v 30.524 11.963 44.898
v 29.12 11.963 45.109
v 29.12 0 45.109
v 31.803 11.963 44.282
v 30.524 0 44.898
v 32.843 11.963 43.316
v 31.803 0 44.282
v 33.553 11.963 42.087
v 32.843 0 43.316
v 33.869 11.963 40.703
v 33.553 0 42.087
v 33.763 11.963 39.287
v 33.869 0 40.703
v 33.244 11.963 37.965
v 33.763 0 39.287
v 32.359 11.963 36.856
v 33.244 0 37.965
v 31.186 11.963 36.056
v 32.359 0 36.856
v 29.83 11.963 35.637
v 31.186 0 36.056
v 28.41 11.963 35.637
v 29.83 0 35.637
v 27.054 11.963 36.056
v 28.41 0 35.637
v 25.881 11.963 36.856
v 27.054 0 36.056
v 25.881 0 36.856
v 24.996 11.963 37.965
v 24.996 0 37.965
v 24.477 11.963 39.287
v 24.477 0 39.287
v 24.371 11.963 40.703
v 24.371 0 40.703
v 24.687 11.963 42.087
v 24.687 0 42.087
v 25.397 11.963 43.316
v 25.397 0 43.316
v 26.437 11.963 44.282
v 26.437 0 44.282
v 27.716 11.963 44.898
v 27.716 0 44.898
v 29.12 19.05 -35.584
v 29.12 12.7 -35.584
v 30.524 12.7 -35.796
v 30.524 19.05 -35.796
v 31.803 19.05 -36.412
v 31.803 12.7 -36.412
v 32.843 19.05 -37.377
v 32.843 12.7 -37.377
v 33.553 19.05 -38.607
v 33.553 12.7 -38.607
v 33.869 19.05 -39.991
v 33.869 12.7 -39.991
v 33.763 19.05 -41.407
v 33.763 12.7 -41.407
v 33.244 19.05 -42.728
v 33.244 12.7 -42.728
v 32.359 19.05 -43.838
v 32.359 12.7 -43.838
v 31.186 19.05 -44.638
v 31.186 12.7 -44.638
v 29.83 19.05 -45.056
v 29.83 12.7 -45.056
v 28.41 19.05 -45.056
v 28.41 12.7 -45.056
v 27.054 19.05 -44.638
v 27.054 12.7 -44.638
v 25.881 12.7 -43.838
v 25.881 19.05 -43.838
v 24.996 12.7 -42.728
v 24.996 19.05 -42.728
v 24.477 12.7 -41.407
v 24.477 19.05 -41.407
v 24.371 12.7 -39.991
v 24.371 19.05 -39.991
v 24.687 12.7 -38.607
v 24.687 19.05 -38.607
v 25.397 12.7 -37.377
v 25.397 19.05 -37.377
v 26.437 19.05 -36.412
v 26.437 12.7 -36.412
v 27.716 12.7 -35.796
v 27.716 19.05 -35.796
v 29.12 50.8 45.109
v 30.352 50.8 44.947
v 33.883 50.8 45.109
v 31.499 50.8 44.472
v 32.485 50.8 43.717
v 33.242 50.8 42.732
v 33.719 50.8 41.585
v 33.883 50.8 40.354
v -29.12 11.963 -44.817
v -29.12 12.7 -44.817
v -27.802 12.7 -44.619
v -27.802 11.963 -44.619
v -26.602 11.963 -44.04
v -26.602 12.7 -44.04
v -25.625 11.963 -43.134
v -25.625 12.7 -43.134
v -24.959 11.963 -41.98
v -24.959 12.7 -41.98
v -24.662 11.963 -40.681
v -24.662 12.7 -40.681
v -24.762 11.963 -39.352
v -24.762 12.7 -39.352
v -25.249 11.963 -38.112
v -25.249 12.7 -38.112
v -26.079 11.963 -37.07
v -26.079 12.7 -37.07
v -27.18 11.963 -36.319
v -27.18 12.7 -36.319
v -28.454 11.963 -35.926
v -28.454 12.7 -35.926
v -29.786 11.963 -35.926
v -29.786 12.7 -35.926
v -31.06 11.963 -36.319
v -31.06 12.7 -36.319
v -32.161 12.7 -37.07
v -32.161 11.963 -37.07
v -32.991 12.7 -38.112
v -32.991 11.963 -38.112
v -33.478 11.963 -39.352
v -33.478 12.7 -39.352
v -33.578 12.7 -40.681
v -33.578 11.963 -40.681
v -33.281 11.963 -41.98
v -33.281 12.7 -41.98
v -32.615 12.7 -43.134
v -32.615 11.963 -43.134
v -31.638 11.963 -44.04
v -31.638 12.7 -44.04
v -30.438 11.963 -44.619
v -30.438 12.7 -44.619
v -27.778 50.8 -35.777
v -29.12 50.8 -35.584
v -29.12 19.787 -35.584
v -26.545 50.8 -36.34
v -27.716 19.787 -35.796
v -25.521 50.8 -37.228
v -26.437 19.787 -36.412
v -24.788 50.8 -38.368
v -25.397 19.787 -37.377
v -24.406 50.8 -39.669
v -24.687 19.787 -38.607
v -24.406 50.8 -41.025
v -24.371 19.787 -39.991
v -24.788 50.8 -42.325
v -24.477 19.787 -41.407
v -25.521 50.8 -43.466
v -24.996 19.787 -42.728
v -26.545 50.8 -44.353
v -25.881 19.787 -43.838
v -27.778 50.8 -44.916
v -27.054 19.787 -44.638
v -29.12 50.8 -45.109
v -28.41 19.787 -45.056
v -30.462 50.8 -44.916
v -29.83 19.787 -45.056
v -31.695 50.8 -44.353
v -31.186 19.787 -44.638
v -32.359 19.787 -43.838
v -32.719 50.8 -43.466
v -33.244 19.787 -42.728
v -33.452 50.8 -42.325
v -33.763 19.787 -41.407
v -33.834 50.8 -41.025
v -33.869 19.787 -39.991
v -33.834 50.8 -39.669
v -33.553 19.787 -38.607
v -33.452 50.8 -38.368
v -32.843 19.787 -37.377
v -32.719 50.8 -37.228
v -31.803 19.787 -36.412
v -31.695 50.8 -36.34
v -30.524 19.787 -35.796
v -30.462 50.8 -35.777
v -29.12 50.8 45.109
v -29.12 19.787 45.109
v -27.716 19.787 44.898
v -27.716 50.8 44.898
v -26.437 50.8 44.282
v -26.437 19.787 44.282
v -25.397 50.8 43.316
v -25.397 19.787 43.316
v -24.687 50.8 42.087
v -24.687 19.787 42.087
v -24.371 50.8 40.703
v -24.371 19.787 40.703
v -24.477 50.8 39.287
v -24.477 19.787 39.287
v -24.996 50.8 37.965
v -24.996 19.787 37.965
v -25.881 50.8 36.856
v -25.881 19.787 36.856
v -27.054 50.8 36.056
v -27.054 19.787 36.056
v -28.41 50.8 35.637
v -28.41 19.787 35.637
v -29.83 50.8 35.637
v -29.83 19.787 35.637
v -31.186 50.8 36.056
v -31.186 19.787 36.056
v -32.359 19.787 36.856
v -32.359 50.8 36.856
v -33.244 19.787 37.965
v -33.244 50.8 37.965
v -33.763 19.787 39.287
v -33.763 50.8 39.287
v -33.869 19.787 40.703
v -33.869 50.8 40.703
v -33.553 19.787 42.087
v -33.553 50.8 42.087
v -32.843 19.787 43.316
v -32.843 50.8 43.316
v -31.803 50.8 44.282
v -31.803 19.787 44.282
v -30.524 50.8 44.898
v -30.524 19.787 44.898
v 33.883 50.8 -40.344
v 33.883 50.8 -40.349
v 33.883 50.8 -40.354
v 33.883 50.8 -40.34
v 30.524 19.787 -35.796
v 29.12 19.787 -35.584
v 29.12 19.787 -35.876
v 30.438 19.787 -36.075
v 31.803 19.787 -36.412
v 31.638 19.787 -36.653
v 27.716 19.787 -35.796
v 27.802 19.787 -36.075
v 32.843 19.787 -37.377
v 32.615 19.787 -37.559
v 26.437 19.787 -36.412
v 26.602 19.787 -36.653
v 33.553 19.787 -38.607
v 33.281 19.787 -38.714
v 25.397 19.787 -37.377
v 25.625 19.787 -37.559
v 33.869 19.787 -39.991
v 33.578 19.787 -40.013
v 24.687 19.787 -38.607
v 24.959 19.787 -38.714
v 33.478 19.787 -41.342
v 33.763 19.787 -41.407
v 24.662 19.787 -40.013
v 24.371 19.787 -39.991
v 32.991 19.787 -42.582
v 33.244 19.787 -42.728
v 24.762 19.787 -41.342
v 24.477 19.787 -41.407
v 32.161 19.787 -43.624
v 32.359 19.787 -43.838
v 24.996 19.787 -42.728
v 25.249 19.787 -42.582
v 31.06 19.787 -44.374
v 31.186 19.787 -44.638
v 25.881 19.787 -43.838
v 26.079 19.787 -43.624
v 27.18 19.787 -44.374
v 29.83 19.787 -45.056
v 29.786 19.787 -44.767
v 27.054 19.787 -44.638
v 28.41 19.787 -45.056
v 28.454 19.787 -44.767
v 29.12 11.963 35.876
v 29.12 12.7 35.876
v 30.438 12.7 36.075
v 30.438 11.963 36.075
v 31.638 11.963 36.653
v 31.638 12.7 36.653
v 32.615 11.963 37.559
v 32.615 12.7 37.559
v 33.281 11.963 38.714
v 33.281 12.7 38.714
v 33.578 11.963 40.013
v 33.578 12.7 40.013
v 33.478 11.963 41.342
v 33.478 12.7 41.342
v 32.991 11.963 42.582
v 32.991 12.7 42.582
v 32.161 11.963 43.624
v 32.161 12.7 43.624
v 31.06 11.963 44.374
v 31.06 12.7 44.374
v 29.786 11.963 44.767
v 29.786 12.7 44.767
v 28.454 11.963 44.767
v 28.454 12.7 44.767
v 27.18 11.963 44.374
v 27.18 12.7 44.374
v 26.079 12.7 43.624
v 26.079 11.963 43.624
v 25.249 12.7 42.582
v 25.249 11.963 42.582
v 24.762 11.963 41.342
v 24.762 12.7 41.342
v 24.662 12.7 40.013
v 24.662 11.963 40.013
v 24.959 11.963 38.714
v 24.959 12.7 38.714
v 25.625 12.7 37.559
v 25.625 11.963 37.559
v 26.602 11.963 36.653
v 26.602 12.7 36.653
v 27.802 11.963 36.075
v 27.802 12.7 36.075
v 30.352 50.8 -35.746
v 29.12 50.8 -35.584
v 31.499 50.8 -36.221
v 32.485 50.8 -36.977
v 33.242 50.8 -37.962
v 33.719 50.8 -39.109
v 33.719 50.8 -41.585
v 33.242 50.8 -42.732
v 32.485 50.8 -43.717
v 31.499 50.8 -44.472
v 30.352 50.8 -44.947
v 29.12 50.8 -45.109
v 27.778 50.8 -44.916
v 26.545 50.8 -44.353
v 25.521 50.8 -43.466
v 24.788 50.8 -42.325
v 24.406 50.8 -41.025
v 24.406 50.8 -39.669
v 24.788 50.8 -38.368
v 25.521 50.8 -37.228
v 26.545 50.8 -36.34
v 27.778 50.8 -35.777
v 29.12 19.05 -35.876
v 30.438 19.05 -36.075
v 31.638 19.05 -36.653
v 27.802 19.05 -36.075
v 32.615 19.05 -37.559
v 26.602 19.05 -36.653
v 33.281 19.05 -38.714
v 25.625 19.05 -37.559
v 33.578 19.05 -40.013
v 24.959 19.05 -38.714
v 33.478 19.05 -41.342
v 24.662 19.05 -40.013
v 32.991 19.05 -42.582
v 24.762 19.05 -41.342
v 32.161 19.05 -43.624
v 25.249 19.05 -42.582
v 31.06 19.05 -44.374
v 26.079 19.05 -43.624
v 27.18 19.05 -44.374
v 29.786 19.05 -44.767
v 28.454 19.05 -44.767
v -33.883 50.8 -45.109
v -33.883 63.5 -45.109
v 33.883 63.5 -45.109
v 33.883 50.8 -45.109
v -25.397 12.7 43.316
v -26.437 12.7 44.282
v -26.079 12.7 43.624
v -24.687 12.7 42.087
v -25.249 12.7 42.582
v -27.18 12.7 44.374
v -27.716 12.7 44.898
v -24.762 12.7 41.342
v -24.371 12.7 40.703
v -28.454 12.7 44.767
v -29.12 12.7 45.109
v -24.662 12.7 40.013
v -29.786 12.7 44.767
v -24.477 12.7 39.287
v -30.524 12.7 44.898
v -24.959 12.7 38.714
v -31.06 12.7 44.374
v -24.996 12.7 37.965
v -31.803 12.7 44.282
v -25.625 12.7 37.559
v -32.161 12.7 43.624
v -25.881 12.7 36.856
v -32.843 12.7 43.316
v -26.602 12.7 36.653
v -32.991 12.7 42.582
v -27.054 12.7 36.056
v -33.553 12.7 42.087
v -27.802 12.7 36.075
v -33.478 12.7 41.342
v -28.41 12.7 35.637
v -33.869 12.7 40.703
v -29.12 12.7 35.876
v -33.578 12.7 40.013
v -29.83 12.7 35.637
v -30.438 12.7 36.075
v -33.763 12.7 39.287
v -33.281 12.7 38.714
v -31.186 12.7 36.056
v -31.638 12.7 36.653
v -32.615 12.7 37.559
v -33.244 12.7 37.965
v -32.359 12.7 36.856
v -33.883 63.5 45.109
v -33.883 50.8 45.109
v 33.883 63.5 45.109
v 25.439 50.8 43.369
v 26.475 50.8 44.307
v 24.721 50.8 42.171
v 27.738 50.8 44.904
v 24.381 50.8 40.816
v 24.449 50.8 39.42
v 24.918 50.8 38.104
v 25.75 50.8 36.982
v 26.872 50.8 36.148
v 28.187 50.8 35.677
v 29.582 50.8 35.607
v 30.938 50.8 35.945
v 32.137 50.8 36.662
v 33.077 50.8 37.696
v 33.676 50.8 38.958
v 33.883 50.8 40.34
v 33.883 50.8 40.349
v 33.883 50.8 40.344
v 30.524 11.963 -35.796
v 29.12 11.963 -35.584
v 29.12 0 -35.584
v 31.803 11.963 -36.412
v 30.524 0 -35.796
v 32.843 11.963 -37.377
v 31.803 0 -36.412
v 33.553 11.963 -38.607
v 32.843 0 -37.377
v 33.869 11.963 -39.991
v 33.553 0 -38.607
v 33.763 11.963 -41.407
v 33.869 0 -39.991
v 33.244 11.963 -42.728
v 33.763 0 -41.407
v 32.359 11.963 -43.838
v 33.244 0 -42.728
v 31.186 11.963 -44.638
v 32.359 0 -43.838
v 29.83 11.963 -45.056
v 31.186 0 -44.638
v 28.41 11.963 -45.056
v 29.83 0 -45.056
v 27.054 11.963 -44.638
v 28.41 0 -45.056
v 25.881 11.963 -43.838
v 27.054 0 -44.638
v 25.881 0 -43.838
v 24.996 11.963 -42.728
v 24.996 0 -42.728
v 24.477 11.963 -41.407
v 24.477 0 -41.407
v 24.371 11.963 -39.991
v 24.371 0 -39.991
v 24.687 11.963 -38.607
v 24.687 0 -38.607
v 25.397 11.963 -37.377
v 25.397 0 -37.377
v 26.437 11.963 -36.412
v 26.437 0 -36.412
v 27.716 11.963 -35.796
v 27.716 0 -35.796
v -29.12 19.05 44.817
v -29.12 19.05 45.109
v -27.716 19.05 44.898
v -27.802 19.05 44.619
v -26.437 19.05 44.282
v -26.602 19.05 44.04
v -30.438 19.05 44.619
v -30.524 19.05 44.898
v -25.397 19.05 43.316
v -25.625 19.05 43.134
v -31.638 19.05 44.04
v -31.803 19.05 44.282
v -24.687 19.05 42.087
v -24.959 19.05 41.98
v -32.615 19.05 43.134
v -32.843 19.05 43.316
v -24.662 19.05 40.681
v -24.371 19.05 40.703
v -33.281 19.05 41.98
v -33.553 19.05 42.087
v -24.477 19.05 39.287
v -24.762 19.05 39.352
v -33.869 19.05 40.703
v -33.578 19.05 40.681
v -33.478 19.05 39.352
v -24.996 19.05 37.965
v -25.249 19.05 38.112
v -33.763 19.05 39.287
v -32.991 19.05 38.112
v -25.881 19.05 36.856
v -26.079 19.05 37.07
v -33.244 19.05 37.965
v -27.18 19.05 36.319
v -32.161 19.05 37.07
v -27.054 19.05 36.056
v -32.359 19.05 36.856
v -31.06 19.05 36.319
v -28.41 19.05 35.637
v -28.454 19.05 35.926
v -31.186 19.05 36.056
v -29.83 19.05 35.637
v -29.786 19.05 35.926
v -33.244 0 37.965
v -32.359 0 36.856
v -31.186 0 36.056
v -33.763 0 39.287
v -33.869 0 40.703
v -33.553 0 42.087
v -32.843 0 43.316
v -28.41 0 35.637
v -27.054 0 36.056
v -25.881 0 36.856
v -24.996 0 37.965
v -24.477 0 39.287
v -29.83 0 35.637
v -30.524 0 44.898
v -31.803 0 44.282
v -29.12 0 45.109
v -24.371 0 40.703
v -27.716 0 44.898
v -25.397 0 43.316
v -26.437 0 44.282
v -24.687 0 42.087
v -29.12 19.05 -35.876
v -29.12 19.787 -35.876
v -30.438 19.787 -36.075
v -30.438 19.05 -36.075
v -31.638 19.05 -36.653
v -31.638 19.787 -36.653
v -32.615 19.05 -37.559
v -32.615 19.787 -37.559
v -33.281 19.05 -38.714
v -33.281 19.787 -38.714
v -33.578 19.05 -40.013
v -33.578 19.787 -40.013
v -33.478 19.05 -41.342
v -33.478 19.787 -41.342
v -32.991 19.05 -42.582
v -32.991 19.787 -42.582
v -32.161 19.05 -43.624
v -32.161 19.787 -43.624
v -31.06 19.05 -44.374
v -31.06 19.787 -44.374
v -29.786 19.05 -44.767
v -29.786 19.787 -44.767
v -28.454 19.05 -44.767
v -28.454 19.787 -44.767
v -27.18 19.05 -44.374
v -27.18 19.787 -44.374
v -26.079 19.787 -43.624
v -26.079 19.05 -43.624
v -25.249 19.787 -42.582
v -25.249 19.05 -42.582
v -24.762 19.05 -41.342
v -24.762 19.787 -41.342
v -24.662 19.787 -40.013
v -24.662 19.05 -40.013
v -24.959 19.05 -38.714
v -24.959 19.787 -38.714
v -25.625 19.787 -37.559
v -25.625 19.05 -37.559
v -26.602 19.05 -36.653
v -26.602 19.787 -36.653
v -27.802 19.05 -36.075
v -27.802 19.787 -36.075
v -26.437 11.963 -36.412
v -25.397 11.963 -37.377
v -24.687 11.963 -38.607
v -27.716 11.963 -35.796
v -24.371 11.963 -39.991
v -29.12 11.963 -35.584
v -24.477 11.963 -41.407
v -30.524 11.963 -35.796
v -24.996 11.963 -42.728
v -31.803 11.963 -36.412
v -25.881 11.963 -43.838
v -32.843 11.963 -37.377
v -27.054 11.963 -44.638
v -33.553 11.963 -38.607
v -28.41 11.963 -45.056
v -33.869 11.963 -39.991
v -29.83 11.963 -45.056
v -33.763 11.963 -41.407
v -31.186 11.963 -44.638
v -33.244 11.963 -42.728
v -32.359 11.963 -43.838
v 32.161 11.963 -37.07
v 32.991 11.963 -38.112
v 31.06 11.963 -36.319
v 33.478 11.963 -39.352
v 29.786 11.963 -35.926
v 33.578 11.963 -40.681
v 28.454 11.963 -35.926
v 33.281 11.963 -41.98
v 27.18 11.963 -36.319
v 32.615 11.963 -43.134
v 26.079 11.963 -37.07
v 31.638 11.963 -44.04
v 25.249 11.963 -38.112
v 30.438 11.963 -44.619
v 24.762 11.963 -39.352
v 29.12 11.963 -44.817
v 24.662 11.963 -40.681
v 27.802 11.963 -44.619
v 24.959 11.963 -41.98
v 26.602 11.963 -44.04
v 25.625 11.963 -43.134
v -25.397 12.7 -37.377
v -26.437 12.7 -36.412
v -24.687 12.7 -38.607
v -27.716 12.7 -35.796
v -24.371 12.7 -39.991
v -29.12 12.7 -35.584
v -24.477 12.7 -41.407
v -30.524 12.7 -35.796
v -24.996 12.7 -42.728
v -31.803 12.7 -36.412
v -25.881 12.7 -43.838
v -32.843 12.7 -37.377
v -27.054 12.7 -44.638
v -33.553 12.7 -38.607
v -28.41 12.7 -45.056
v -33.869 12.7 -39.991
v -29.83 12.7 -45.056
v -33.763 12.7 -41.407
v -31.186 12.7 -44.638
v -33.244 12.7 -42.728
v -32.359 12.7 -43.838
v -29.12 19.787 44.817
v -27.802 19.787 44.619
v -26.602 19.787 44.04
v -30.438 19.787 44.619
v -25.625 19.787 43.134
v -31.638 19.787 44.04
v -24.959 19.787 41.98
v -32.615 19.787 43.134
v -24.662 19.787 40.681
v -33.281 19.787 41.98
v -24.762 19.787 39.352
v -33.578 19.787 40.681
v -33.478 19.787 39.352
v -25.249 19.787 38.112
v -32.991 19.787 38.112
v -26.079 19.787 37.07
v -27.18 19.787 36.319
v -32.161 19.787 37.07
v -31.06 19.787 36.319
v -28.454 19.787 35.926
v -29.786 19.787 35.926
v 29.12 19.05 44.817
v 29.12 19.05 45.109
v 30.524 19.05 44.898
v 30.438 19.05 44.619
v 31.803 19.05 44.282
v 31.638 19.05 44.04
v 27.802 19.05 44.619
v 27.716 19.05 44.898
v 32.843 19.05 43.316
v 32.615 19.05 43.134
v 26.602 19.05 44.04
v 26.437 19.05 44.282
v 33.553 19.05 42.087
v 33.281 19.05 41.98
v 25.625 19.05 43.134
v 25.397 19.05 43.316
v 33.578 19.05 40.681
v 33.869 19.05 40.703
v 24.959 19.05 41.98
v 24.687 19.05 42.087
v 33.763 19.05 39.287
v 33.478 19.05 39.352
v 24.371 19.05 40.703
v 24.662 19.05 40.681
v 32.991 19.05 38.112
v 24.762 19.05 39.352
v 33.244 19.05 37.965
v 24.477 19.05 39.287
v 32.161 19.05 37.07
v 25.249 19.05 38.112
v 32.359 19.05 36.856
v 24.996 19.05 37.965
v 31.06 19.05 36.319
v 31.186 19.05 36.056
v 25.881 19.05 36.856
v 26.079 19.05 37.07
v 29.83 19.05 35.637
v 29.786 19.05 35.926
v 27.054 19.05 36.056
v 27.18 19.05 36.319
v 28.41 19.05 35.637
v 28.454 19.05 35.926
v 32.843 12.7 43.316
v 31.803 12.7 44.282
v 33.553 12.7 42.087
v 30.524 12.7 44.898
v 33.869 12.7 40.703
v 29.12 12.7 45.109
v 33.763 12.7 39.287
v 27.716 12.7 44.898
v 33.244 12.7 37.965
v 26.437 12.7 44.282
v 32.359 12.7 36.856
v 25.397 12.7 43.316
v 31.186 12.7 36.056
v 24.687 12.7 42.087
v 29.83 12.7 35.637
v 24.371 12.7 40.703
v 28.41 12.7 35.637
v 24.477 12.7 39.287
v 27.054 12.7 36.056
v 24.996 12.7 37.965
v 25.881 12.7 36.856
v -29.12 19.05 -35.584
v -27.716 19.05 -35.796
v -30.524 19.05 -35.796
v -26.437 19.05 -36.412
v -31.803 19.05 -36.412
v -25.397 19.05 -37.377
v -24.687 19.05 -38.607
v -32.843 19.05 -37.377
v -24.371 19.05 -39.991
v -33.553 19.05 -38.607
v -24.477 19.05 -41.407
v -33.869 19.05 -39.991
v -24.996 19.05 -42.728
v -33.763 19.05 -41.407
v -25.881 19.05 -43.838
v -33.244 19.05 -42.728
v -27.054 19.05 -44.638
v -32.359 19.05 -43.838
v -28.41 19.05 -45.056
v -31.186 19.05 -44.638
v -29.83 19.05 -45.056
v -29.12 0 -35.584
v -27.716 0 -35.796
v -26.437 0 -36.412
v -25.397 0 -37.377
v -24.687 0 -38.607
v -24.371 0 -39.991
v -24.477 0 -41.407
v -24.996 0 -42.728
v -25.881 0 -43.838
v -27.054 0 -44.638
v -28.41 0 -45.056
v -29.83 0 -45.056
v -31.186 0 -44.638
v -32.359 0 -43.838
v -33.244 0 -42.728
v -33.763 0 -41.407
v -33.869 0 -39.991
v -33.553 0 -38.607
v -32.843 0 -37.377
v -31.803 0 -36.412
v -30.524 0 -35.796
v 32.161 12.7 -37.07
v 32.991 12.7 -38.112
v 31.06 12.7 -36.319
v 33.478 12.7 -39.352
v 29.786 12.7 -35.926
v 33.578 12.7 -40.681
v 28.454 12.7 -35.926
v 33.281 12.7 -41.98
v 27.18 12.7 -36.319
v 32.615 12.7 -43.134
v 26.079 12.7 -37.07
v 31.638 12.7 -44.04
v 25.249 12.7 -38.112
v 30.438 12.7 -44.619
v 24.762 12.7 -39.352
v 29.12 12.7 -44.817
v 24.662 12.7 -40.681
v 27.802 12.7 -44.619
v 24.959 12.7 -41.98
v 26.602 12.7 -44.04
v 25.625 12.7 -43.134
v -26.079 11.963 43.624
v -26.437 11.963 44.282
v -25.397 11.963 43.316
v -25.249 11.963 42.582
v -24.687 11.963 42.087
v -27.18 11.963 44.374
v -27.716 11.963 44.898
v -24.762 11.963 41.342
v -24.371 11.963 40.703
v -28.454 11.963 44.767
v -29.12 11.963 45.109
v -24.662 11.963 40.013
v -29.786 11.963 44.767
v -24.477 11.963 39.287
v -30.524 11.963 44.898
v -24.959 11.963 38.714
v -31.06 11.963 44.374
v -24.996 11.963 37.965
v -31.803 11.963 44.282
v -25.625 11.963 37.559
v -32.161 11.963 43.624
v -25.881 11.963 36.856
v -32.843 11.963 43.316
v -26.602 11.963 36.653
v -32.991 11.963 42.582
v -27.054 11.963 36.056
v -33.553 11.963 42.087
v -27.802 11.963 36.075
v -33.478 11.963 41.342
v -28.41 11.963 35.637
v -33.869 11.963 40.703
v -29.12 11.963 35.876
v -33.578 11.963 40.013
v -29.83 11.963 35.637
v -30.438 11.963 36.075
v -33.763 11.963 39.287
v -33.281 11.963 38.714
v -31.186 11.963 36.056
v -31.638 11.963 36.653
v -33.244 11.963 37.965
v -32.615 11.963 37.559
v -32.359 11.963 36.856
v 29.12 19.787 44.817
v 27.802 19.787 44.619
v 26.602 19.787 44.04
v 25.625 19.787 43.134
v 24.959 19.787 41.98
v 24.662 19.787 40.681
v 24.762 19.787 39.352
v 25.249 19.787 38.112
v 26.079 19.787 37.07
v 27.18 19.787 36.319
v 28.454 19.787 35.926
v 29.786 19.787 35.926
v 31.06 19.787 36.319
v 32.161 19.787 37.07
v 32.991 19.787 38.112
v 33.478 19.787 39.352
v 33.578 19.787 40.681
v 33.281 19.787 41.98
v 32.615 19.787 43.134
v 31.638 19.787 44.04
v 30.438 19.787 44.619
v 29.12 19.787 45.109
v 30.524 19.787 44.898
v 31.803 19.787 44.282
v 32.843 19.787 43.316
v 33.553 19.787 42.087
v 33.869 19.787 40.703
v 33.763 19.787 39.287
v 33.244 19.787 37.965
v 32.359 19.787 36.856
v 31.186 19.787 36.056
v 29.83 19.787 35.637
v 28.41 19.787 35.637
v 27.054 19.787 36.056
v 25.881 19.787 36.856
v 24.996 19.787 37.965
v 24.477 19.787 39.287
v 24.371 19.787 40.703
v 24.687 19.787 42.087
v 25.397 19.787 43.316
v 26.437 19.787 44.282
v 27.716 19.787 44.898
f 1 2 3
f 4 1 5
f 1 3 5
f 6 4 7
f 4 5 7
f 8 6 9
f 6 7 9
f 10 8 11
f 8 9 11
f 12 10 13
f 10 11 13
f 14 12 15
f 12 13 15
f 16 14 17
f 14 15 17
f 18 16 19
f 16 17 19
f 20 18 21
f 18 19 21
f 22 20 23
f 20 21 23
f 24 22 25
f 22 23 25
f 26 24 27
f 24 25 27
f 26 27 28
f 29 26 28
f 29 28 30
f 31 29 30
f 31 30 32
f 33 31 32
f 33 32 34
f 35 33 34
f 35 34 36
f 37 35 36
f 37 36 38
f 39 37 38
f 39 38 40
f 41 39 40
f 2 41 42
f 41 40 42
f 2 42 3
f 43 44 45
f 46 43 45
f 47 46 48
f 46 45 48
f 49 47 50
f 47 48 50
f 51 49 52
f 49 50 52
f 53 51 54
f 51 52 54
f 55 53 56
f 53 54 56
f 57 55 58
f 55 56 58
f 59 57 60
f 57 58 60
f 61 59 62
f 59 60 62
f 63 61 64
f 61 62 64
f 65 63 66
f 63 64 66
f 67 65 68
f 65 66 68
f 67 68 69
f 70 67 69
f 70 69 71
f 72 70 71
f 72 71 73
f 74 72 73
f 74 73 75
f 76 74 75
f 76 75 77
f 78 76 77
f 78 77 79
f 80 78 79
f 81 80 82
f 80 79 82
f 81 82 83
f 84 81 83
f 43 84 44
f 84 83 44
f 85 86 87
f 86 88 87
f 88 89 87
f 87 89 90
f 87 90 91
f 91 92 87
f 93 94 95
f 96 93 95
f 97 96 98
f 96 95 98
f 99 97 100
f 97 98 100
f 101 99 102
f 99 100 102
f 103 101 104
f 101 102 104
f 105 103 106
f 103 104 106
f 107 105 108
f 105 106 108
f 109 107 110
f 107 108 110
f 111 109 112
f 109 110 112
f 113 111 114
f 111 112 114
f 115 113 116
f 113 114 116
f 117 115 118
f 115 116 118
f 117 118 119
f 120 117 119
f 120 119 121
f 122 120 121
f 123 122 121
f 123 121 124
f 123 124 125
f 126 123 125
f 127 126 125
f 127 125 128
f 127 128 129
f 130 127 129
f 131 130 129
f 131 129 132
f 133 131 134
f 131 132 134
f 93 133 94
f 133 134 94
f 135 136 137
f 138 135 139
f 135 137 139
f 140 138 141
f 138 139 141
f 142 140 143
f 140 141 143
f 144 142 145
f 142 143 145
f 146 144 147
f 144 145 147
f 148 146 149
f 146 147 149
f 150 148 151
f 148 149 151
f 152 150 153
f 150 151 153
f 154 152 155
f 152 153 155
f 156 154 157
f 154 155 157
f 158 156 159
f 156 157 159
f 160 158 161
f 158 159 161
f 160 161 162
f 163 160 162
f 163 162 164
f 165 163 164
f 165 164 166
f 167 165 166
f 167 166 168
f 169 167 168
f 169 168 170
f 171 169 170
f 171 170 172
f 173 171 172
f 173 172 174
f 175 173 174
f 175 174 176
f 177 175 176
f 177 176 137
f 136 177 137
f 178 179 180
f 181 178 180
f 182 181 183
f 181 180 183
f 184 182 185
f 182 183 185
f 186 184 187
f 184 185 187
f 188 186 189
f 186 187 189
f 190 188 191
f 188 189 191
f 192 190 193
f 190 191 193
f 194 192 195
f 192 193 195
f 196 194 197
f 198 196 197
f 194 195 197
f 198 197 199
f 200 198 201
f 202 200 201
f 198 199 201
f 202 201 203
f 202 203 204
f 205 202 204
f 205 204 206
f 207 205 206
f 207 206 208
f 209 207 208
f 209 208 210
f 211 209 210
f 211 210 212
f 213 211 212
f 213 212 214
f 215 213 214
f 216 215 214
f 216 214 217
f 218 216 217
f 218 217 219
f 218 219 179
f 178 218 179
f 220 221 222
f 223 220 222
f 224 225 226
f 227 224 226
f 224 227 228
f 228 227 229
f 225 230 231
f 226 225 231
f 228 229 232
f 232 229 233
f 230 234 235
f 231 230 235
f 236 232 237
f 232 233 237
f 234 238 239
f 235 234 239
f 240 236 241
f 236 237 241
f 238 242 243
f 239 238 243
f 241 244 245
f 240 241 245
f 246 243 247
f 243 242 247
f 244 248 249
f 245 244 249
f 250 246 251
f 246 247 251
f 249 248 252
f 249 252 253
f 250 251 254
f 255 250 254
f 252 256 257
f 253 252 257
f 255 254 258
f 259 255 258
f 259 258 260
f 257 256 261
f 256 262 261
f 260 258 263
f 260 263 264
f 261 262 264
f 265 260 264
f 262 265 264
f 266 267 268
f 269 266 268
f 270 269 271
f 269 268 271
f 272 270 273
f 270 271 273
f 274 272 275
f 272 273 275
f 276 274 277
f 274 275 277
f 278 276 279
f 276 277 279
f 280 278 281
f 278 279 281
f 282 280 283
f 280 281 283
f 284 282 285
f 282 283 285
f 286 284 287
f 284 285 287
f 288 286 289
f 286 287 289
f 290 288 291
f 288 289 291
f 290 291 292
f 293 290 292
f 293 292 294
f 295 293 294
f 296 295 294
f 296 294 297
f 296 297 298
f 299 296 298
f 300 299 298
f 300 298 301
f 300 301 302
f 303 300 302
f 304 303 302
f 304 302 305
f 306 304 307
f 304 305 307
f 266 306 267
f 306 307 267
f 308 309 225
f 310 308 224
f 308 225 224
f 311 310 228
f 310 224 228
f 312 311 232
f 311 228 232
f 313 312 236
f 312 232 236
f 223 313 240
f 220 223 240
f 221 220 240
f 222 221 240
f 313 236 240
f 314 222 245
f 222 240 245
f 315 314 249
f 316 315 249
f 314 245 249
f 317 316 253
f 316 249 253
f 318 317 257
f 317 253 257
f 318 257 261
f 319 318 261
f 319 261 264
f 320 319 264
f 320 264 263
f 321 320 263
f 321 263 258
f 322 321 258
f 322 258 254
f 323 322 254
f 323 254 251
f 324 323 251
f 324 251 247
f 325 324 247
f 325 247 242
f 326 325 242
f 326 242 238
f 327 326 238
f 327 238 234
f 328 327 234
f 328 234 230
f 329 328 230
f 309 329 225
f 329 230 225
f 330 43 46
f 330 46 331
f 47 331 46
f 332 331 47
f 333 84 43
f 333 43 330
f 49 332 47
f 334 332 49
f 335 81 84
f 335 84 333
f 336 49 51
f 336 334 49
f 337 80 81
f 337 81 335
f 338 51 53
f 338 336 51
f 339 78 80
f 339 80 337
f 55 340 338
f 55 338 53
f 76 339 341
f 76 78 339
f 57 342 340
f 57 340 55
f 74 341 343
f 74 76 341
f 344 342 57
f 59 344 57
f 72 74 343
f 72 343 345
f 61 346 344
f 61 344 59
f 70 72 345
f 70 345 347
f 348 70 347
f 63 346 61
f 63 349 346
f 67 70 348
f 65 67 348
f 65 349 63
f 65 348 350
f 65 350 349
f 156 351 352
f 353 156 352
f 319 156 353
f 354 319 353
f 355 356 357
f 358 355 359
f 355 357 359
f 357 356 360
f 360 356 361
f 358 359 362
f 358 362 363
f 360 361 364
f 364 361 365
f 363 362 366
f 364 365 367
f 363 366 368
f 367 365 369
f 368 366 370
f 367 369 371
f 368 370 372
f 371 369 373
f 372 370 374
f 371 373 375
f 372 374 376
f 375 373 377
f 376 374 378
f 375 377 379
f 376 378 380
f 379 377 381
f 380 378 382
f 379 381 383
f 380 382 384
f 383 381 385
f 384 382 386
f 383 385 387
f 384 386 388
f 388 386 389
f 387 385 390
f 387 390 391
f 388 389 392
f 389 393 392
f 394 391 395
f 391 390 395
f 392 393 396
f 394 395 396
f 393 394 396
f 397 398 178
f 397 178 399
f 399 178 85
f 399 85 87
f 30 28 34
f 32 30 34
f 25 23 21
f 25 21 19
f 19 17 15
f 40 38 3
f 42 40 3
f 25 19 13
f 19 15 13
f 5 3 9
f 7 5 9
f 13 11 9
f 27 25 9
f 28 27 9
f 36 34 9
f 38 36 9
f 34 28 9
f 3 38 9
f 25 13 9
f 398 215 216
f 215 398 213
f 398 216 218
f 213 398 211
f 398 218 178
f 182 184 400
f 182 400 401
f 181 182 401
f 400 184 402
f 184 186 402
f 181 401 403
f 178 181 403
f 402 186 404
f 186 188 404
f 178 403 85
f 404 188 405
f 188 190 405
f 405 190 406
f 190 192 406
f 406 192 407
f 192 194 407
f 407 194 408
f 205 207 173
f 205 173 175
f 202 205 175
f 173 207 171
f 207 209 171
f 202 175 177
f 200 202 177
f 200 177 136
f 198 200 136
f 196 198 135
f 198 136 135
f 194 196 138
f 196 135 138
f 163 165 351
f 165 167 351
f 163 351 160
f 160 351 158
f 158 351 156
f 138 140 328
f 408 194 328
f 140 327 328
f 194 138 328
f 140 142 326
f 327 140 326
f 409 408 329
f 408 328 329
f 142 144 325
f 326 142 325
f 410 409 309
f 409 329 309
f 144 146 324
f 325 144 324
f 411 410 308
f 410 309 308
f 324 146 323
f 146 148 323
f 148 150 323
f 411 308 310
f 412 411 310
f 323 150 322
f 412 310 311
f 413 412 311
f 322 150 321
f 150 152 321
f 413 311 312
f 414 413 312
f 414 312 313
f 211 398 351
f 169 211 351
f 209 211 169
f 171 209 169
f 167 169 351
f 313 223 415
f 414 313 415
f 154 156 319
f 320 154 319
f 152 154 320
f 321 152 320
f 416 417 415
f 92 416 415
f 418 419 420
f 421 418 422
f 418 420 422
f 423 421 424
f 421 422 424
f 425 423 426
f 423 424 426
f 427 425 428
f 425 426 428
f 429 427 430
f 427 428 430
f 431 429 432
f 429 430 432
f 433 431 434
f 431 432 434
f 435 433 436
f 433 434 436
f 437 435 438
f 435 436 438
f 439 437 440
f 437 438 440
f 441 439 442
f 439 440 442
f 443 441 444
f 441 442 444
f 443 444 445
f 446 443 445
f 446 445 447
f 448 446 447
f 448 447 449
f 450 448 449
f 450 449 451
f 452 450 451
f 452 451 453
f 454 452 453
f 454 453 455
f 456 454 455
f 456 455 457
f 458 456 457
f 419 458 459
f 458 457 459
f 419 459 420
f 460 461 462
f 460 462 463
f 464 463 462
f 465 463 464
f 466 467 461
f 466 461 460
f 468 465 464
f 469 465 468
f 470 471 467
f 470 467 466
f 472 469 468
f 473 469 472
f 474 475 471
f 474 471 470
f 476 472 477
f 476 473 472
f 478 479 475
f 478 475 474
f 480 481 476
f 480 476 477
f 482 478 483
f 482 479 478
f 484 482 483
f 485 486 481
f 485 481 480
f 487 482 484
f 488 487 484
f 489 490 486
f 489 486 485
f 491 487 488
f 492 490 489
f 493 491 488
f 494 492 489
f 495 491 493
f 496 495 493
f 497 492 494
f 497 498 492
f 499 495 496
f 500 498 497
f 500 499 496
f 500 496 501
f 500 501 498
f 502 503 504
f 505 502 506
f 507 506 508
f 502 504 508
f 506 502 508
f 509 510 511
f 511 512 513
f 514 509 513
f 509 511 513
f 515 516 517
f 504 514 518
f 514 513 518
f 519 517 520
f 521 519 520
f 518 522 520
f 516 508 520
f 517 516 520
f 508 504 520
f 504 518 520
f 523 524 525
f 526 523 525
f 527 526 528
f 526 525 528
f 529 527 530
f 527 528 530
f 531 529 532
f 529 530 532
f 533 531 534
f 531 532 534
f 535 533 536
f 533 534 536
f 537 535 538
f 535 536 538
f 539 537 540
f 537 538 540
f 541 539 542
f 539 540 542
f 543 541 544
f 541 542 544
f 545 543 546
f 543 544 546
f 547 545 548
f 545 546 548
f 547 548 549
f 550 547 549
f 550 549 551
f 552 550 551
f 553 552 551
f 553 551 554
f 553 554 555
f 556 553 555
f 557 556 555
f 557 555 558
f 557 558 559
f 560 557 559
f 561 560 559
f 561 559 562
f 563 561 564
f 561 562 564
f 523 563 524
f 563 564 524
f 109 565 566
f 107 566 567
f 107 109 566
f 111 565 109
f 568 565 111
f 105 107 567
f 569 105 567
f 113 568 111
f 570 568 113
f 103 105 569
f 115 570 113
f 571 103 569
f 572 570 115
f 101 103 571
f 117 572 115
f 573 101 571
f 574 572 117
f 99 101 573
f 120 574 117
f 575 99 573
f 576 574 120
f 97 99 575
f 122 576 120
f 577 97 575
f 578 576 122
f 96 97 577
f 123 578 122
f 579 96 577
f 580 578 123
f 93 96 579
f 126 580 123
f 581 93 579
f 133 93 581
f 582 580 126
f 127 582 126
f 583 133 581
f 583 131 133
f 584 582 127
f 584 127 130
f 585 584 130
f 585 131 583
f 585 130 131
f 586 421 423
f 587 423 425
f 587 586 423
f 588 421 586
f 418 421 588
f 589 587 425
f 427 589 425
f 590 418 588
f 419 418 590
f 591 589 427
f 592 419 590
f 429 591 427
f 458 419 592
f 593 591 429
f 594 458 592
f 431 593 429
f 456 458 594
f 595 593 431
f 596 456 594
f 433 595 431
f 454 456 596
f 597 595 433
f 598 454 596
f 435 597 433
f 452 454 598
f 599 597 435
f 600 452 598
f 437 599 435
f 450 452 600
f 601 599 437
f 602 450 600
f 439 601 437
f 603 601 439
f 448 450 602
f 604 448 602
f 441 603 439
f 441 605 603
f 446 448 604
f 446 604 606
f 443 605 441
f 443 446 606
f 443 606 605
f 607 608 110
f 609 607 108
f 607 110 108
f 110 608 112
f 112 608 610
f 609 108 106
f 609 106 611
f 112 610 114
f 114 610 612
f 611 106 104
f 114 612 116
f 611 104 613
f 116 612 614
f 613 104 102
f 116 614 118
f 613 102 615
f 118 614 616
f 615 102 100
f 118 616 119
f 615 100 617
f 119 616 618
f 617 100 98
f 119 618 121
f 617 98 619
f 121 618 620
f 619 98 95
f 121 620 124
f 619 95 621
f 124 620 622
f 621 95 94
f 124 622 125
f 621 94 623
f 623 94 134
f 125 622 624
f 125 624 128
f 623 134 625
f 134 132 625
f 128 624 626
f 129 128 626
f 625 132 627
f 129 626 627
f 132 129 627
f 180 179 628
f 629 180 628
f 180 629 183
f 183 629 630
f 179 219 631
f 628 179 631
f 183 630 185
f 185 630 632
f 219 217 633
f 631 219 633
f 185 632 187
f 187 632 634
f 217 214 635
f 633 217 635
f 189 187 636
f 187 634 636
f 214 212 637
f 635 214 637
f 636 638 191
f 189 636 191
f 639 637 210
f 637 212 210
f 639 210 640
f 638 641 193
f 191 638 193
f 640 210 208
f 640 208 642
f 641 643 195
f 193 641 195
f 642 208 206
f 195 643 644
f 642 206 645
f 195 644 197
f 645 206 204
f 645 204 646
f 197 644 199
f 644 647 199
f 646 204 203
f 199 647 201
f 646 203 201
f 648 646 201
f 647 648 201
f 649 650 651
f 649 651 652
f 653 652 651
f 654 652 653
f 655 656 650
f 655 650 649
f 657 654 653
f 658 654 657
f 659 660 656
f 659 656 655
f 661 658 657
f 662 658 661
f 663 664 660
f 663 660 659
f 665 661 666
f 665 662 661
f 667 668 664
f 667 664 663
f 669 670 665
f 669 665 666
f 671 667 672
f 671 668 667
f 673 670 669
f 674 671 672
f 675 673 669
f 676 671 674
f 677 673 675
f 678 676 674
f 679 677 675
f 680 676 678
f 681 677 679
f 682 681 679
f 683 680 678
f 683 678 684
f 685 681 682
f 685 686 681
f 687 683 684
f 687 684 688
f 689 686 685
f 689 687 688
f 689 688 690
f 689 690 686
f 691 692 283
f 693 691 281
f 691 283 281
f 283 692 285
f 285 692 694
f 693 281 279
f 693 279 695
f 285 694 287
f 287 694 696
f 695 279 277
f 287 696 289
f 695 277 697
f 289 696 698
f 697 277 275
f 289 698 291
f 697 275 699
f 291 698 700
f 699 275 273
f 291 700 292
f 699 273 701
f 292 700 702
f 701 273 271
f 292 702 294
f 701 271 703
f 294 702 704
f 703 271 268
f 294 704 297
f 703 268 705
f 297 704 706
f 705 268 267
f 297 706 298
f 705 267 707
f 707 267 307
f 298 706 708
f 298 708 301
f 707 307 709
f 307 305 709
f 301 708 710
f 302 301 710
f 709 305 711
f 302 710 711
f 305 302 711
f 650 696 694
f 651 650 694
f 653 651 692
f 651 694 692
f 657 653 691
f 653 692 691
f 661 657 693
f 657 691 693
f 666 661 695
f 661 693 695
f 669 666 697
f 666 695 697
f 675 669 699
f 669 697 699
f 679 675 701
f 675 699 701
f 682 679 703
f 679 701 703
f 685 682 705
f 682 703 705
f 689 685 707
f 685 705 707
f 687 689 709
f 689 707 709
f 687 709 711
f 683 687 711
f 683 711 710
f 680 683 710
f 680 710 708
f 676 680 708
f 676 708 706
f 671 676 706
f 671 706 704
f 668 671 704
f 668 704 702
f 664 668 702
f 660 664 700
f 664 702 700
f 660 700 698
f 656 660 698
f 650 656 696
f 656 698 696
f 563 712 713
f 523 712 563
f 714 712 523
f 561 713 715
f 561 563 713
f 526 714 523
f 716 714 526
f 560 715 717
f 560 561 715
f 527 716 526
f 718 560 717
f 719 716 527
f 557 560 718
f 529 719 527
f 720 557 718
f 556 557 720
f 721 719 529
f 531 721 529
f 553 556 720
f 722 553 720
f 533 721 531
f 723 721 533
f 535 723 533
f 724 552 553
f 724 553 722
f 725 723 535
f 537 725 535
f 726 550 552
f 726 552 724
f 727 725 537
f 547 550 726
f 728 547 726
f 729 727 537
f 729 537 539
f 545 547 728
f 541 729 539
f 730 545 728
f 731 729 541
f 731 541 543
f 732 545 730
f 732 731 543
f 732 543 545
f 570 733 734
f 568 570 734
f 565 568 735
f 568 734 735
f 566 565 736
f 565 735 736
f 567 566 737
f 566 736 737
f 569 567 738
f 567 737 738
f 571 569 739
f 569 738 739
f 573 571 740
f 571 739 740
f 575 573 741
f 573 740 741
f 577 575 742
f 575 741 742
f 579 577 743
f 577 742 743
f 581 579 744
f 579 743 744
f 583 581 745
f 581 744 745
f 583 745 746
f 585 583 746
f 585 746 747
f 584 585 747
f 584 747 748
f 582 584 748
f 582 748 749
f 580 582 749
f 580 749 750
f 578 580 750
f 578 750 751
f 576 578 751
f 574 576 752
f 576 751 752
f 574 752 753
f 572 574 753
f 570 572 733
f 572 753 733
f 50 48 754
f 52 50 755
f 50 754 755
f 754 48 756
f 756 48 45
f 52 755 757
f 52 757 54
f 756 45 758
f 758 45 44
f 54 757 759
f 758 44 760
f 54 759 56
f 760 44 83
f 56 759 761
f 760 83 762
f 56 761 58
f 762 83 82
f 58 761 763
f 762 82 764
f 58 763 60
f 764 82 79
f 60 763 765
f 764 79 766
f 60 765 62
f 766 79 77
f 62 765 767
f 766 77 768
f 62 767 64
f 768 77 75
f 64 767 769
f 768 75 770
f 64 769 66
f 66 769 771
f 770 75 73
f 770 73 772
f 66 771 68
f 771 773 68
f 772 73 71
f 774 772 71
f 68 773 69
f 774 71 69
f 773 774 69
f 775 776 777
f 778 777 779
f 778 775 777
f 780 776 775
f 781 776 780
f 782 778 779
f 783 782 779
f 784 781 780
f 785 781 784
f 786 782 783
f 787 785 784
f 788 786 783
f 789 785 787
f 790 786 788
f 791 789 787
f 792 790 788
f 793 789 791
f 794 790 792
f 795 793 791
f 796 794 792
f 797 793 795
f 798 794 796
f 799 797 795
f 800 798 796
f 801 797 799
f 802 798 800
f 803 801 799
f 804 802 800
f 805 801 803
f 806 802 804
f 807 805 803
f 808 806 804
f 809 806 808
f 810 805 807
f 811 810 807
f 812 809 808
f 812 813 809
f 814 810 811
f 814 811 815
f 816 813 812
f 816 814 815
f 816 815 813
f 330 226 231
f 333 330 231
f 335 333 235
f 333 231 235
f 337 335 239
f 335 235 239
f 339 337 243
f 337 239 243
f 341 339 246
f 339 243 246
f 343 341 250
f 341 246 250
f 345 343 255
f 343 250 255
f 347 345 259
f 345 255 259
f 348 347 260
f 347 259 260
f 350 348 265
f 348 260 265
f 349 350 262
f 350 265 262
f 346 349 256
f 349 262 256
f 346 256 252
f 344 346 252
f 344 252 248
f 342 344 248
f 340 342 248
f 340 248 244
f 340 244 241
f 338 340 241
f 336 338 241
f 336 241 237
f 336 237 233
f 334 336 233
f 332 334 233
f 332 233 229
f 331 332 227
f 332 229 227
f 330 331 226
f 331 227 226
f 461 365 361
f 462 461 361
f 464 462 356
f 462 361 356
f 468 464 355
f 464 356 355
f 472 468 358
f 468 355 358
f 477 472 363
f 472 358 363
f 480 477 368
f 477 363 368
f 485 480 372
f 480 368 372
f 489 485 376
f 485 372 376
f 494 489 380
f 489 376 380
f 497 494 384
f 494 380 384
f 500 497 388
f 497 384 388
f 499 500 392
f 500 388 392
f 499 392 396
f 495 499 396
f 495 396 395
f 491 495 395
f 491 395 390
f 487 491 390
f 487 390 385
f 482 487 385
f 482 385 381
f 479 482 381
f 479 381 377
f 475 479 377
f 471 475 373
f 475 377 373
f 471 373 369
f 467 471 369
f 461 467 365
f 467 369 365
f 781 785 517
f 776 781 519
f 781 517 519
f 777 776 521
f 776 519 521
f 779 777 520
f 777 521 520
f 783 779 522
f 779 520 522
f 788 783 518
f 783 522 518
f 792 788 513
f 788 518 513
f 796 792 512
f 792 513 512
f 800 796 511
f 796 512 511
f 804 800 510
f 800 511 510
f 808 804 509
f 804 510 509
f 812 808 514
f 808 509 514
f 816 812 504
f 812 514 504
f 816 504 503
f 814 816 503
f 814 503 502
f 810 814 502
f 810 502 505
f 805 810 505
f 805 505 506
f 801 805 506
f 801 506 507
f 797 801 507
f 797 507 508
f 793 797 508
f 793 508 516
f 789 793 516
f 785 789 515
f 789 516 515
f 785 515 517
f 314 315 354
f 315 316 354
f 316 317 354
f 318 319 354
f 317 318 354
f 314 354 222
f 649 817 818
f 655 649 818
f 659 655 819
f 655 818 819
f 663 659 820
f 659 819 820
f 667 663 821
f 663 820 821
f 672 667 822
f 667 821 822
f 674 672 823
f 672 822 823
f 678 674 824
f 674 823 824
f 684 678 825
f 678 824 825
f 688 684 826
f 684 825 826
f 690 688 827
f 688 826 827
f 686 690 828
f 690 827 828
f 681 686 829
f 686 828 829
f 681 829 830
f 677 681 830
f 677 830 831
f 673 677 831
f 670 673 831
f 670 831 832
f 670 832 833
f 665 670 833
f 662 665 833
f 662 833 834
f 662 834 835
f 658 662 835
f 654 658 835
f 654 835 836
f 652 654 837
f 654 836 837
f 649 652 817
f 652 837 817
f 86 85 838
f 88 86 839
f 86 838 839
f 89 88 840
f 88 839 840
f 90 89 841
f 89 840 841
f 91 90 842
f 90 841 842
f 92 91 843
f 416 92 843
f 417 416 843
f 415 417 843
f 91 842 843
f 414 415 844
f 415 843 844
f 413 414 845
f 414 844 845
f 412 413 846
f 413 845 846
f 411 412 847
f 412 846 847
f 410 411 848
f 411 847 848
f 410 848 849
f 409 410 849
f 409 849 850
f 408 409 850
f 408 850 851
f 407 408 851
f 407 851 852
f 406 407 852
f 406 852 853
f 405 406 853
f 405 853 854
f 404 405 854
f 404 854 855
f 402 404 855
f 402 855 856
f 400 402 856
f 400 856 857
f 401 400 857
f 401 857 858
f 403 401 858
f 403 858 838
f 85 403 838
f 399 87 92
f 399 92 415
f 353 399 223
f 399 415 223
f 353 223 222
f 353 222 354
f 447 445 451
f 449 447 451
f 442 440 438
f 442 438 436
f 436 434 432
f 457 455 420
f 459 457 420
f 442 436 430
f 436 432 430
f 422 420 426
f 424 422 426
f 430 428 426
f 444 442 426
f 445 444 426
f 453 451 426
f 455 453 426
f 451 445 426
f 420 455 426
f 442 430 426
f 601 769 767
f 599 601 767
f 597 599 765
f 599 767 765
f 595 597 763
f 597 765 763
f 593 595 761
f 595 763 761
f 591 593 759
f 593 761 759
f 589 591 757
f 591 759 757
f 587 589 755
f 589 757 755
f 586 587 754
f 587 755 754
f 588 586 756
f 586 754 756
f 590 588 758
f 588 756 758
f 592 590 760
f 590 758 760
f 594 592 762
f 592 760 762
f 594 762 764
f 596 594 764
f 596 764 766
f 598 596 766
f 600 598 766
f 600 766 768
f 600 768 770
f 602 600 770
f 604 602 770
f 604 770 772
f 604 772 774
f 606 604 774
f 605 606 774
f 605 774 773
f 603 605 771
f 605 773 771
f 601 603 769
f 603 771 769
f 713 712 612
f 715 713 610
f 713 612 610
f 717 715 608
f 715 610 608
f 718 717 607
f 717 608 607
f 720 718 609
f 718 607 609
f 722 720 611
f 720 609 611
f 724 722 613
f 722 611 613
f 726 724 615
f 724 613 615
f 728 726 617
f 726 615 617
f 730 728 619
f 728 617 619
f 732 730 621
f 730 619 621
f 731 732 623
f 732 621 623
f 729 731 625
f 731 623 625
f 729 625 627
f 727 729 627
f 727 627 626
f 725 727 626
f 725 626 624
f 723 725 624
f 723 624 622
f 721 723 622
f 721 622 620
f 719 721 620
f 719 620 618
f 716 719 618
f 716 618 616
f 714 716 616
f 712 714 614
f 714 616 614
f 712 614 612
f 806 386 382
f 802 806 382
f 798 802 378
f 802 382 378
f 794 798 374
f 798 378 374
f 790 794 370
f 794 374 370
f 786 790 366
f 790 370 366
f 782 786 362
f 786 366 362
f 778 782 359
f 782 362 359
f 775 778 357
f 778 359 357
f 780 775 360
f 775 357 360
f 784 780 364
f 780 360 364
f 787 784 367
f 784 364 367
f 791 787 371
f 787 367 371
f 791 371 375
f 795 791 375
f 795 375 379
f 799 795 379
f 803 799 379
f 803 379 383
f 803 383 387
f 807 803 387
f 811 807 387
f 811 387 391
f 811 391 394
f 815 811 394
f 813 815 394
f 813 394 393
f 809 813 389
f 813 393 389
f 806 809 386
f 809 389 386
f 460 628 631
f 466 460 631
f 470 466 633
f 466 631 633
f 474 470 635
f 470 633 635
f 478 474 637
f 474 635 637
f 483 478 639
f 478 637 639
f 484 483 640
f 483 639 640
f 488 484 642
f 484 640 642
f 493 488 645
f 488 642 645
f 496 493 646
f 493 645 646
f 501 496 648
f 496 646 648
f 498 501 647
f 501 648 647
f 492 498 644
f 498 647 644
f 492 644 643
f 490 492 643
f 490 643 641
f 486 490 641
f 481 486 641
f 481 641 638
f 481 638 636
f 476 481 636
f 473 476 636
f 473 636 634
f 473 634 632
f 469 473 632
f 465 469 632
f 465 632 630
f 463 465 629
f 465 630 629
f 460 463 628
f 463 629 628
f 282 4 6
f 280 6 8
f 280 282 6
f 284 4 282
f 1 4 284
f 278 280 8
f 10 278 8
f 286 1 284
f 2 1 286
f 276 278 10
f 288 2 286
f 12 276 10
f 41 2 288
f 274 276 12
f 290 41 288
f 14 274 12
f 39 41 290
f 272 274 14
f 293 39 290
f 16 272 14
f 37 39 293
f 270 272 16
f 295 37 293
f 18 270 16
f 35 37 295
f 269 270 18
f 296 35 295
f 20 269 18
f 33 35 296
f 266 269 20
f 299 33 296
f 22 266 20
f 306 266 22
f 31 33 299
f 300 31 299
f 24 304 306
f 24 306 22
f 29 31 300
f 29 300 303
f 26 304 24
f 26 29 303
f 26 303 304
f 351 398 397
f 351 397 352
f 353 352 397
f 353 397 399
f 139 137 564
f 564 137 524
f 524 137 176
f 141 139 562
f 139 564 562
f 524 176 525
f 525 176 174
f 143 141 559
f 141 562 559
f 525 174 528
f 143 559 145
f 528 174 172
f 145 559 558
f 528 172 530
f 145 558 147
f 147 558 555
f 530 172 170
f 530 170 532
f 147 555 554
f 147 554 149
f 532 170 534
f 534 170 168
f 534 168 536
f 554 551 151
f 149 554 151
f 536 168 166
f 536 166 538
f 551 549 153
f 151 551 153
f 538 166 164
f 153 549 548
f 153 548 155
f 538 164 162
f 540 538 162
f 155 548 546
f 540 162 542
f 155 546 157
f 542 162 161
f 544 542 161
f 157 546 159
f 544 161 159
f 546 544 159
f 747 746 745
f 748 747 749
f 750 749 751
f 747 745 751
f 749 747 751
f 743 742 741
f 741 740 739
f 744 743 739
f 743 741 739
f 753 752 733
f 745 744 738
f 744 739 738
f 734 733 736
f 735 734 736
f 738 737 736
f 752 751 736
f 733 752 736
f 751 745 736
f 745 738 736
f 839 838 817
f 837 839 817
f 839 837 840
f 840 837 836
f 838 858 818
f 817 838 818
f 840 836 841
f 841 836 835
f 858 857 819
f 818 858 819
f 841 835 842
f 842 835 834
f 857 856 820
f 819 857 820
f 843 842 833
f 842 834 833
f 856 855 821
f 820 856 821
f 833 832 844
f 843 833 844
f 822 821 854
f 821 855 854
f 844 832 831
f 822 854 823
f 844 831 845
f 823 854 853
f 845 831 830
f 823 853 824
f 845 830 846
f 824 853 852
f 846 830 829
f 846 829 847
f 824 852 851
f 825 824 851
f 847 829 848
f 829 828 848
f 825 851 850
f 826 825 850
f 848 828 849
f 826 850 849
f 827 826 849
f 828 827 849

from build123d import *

# Parameters (mm, degrees)
SKETCH1_R             = 4.7625
BOSS_EXTRUDE1_DEPTH   = 50.8
BOSS_EXTRUDE1_2_DEPTH = 50.8
BOSS_EXTRUDE1_3_DEPTH = 50.8
BOSS_EXTRUDE1_4_DEPTH = 50.8
SKETCH2_W             = 67.765000106
SKETCH2_H             = 90.2184886
BOSS_EXTRUDE2_DEPTH   = 12.7
CUT_EXTRUDE1_START    = -0.7366
F_3DSKETCH1_R         = 4.7625
CUT_EXTRUDE1_DEPTH    = 0.7366
SKETCH3_R             = 4.4704
BOSS_EXTRUDE3_DEPTH   = 0.7366
F_3DSKETCH2_R         = 5.08
CUT_EXTRUDE2_DEPTH    = 0.7366
SKETCH4_R             = 4.4704
BOSS_EXTRUDE4_DEPTH   = 0.7366


with BuildPart() as part:
    # Sketch1 → Boss-Extrude1 (new body)
    with BuildSketch(Plane(origin=(0, 0, 0), x_dir=(1, 0, 0), z_dir=(0, 1, 0))):
        with Locations(Location((-29.1199951, 40.3467443, 0), (0, 0, 270))):
            Circle(SKETCH1_R)
    extrude(amount=BOSS_EXTRUDE1_DEPTH)



with BuildPart() as body_2:
    # Sketch1 → Boss-Extrude1 2 (new body)
    with BuildSketch(Plane(origin=(0, 0, 0), x_dir=(1, 0, 0), z_dir=(0, 1, 0))):
        with Locations(Location((-29.1199951, -40.3467443, 0), (0, 0, 270))):
            Circle(SKETCH1_R)
    extrude(amount=BOSS_EXTRUDE1_2_DEPTH)


with BuildPart() as body_3:
    # Sketch1 → Boss-Extrude1 3 (new body)
    with BuildSketch(Plane(origin=(0, 0, 0), x_dir=(1, 0, 0), z_dir=(0, 1, 0))):
        with Locations(Location((29.120005006, -40.3467443, 0), (0, 0, 270))):
            Circle(SKETCH1_R)
    extrude(amount=BOSS_EXTRUDE1_3_DEPTH)


with BuildPart() as body_4:
    # Sketch1 → Boss-Extrude1 4 (new body)
    with BuildSketch(Plane(origin=(0, 0, 0), x_dir=(1, 0, 0), z_dir=(0, 1, 0))):
        with Locations(Location((29.120005006, 40.3467443, 0), (0, 0, 270))):
            Circle(SKETCH1_R)
    extrude(amount=BOSS_EXTRUDE1_4_DEPTH)


with BuildPart() as part_1:
    add(part.part)

    add(body_2.part)  # Boss-Extrude2 merges body 2

    add(body_3.part)  # Boss-Extrude2 merges body 3

    add(body_4.part)  # Boss-Extrude2 merges body 4
    # Sketch2 → Boss-Extrude2 (add)
    with BuildSketch(Plane(origin=(0, 50.8, 0), x_dir=(1, 0, 0), z_dir=(0, 1, 0))):
        with Locations((4.953e-06, 0)):
            Rectangle(SKETCH2_W, SKETCH2_H)
    extrude(amount=BOSS_EXTRUDE2_DEPTH)

    # 3DSketch1 → Cut-Extrude1 (cut)
    with BuildSketch(Plane(origin=(-29.1199951, 12.7, 40.3467443), x_dir=(0.5852354085547554, 0, -0.8108634389178911), z_dir=(0, 1, 0)).offset(CUT_EXTRUDE1_START)):
        with Locations(Location((0, 0, 0), (0, 0, 35.819622287))):
            Circle(F_3DSKETCH1_R)
        with Locations(Location((34.084110256, -47.224686769, 0), (0, 0, 35.819622287))):
            Circle(F_3DSKETCH1_R)
        with Locations(Location((99.515509921, 0, 0), (0, 0, 35.819622287))):
            Circle(F_3DSKETCH1_R)
        with Locations(Location((65.431399664, 47.224686769, 0), (0, 0, 35.819622287))):
            Circle(F_3DSKETCH1_R)
    extrude(amount=CUT_EXTRUDE1_DEPTH, mode=Mode.SUBTRACT)


with BuildPart() as cut_extrude1_piece_1:
    # of the separate pieces the step leaves, piece 1, a body of its own (cut_extrude1_pieces)
    add(part_1.part.solids().sort_by_distance((-29.1199951, 12.7, -35.5842443))[0])



with BuildPart() as cut_extrude1_piece_2:
    # of the separate pieces the step leaves, piece 2, a body of its own (cut_extrude1_pieces)
    add(part_1.part.solids().sort_by_distance((-29.1199951, 0, 45.1092443))[0])


with BuildPart() as cut_extrude1_piece_3:
    # of the separate pieces the step leaves, piece 3, a body of its own (cut_extrude1_pieces)
    add(part_1.part.solids().sort_by_distance((-29.1199951, 0, -35.5842443))[0])


with BuildPart() as cut_extrude1_piece_4:
    # of the separate pieces the step leaves, piece 4, a body of its own (cut_extrude1_pieces)
    add(part_1.part.solids().sort_by_distance((29.120005006, 0, -35.5842443))[0])


with BuildPart() as cut_extrude1_piece_5:
    # of the separate pieces the step leaves, piece 5, a body of its own (cut_extrude1_pieces)
    add(part_1.part.solids().sort_by_distance((29.120005006, 0, 45.1092443))[0])


with BuildPart() as cut_extrude1_piece_1_1:
    add(cut_extrude1_piece_1.part)

    add(cut_extrude1_piece_2.part)  # Boss-Extrude3 merges Cut-Extrude1 piece 2

    add(cut_extrude1_piece_3.part)  # Boss-Extrude3 merges Cut-Extrude1 piece 3

    add(cut_extrude1_piece_4.part)  # Boss-Extrude3 merges Cut-Extrude1 piece 4

    add(cut_extrude1_piece_5.part)  # Boss-Extrude3 merges Cut-Extrude1 piece 5
    # Sketch3 → Boss-Extrude3 (add)
    with BuildSketch(Plane(origin=(0, 12.7, 0), x_dir=(-1, 0, 0), z_dir=(0, -1, 0))):
        with Locations(Location((29.1199951, 40.3467443, 0), (0, 0, 90))):
            Circle(SKETCH3_R)
        with Locations(Location((-29.120005006, 40.3467443, 0), (0, 0, 90))):
            Circle(SKETCH3_R)
        with Locations(Location((-29.120005006, -40.3467443, 0), (0, 0, 90))):
            Circle(SKETCH3_R)
        with Locations(Location((29.1199951, -40.3467443, 0), (0, 0, 90))):
            Circle(SKETCH3_R)
    extrude(amount=BOSS_EXTRUDE3_DEPTH)

    # 3DSketch2 → Cut-Extrude2 (cut)
    with BuildSketch(Plane(origin=(-29.1199951, 19.05, 40.3467443), x_dir=(0.5852354085547554, 0, -0.8108634389178911), z_dir=(0, 1, 0))):
        Circle(F_3DSKETCH2_R)
        with Locations((34.084110256, -47.224686769)):
            Circle(F_3DSKETCH2_R)
        with Locations((99.515509921, 0)):
            Circle(F_3DSKETCH2_R)
        with Locations((65.431399664, 47.224686769)):
            Circle(F_3DSKETCH2_R)
    extrude(amount=CUT_EXTRUDE2_DEPTH, mode=Mode.SUBTRACT)


with BuildPart() as cut_extrude2_piece_1:
    # of the separate pieces the step leaves, piece 1, a body of its own (cut_extrude2_pieces)
    add(cut_extrude1_piece_1_1.part.solids().sort_by_distance((29.120005006, 19.7866, 45.1092443))[0])



with BuildPart() as cut_extrude2_piece_2:
    # of the separate pieces the step leaves, piece 2, a body of its own (cut_extrude2_pieces)
    add(cut_extrude1_piece_1_1.part.solids().sort_by_distance((-29.1199951, 12.7, 45.1092443))[0])


with BuildPart() as cut_extrude2_piece_3:
    # of the separate pieces the step leaves, piece 3, a body of its own (cut_extrude2_pieces)
    add(cut_extrude1_piece_1_1.part.solids().sort_by_distance((-29.1199951, 12.7, -35.5842443))[0])


with BuildPart() as cut_extrude2_piece_4:
    # of the separate pieces the step leaves, piece 4, a body of its own (cut_extrude2_pieces)
    add(cut_extrude1_piece_1_1.part.solids().sort_by_distance((29.120005006, 12.7, -35.5842443))[0])


with BuildPart() as cut_extrude2_piece_5:
    # of the separate pieces the step leaves, piece 5, a body of its own (cut_extrude2_pieces)
    add(cut_extrude1_piece_1_1.part.solids().sort_by_distance((29.120005006, 0, 45.1092443))[0])


with BuildPart() as cut_extrude2_piece_1_1:
    add(cut_extrude2_piece_1.part)

    add(cut_extrude2_piece_2.part)  # Boss-Extrude4 merges Cut-Extrude2 piece 2

    add(cut_extrude2_piece_3.part)  # Boss-Extrude4 merges Cut-Extrude2 piece 3

    add(cut_extrude2_piece_4.part)  # Boss-Extrude4 merges Cut-Extrude2 piece 4

    add(cut_extrude2_piece_5.part)  # Boss-Extrude4 merges Cut-Extrude2 piece 5
    # Sketch4 → Boss-Extrude4 (add)
    with BuildSketch(Plane(origin=(0, 19.7866, 0), x_dir=(-1, 0, 0), z_dir=(0, -1, 0))):
        with Locations(Location((29.1199951, -40.3467443, 0), (0, 0, 270))):
            Circle(SKETCH4_R)
        with Locations(Location((-29.120005006, -40.3467443, 0), (0, 0, 270))):
            Circle(SKETCH4_R)
        with Locations(Location((-29.120005006, 40.3467443, 0), (0, 0, 270))):
            Circle(SKETCH4_R)
        with Locations(Location((29.1199951, 40.3467443, 0), (0, 0, 270))):
            Circle(SKETCH4_R)
    extrude(amount=BOSS_EXTRUDE4_DEPTH)


solid = cut_extrude2_piece_1_1.part
